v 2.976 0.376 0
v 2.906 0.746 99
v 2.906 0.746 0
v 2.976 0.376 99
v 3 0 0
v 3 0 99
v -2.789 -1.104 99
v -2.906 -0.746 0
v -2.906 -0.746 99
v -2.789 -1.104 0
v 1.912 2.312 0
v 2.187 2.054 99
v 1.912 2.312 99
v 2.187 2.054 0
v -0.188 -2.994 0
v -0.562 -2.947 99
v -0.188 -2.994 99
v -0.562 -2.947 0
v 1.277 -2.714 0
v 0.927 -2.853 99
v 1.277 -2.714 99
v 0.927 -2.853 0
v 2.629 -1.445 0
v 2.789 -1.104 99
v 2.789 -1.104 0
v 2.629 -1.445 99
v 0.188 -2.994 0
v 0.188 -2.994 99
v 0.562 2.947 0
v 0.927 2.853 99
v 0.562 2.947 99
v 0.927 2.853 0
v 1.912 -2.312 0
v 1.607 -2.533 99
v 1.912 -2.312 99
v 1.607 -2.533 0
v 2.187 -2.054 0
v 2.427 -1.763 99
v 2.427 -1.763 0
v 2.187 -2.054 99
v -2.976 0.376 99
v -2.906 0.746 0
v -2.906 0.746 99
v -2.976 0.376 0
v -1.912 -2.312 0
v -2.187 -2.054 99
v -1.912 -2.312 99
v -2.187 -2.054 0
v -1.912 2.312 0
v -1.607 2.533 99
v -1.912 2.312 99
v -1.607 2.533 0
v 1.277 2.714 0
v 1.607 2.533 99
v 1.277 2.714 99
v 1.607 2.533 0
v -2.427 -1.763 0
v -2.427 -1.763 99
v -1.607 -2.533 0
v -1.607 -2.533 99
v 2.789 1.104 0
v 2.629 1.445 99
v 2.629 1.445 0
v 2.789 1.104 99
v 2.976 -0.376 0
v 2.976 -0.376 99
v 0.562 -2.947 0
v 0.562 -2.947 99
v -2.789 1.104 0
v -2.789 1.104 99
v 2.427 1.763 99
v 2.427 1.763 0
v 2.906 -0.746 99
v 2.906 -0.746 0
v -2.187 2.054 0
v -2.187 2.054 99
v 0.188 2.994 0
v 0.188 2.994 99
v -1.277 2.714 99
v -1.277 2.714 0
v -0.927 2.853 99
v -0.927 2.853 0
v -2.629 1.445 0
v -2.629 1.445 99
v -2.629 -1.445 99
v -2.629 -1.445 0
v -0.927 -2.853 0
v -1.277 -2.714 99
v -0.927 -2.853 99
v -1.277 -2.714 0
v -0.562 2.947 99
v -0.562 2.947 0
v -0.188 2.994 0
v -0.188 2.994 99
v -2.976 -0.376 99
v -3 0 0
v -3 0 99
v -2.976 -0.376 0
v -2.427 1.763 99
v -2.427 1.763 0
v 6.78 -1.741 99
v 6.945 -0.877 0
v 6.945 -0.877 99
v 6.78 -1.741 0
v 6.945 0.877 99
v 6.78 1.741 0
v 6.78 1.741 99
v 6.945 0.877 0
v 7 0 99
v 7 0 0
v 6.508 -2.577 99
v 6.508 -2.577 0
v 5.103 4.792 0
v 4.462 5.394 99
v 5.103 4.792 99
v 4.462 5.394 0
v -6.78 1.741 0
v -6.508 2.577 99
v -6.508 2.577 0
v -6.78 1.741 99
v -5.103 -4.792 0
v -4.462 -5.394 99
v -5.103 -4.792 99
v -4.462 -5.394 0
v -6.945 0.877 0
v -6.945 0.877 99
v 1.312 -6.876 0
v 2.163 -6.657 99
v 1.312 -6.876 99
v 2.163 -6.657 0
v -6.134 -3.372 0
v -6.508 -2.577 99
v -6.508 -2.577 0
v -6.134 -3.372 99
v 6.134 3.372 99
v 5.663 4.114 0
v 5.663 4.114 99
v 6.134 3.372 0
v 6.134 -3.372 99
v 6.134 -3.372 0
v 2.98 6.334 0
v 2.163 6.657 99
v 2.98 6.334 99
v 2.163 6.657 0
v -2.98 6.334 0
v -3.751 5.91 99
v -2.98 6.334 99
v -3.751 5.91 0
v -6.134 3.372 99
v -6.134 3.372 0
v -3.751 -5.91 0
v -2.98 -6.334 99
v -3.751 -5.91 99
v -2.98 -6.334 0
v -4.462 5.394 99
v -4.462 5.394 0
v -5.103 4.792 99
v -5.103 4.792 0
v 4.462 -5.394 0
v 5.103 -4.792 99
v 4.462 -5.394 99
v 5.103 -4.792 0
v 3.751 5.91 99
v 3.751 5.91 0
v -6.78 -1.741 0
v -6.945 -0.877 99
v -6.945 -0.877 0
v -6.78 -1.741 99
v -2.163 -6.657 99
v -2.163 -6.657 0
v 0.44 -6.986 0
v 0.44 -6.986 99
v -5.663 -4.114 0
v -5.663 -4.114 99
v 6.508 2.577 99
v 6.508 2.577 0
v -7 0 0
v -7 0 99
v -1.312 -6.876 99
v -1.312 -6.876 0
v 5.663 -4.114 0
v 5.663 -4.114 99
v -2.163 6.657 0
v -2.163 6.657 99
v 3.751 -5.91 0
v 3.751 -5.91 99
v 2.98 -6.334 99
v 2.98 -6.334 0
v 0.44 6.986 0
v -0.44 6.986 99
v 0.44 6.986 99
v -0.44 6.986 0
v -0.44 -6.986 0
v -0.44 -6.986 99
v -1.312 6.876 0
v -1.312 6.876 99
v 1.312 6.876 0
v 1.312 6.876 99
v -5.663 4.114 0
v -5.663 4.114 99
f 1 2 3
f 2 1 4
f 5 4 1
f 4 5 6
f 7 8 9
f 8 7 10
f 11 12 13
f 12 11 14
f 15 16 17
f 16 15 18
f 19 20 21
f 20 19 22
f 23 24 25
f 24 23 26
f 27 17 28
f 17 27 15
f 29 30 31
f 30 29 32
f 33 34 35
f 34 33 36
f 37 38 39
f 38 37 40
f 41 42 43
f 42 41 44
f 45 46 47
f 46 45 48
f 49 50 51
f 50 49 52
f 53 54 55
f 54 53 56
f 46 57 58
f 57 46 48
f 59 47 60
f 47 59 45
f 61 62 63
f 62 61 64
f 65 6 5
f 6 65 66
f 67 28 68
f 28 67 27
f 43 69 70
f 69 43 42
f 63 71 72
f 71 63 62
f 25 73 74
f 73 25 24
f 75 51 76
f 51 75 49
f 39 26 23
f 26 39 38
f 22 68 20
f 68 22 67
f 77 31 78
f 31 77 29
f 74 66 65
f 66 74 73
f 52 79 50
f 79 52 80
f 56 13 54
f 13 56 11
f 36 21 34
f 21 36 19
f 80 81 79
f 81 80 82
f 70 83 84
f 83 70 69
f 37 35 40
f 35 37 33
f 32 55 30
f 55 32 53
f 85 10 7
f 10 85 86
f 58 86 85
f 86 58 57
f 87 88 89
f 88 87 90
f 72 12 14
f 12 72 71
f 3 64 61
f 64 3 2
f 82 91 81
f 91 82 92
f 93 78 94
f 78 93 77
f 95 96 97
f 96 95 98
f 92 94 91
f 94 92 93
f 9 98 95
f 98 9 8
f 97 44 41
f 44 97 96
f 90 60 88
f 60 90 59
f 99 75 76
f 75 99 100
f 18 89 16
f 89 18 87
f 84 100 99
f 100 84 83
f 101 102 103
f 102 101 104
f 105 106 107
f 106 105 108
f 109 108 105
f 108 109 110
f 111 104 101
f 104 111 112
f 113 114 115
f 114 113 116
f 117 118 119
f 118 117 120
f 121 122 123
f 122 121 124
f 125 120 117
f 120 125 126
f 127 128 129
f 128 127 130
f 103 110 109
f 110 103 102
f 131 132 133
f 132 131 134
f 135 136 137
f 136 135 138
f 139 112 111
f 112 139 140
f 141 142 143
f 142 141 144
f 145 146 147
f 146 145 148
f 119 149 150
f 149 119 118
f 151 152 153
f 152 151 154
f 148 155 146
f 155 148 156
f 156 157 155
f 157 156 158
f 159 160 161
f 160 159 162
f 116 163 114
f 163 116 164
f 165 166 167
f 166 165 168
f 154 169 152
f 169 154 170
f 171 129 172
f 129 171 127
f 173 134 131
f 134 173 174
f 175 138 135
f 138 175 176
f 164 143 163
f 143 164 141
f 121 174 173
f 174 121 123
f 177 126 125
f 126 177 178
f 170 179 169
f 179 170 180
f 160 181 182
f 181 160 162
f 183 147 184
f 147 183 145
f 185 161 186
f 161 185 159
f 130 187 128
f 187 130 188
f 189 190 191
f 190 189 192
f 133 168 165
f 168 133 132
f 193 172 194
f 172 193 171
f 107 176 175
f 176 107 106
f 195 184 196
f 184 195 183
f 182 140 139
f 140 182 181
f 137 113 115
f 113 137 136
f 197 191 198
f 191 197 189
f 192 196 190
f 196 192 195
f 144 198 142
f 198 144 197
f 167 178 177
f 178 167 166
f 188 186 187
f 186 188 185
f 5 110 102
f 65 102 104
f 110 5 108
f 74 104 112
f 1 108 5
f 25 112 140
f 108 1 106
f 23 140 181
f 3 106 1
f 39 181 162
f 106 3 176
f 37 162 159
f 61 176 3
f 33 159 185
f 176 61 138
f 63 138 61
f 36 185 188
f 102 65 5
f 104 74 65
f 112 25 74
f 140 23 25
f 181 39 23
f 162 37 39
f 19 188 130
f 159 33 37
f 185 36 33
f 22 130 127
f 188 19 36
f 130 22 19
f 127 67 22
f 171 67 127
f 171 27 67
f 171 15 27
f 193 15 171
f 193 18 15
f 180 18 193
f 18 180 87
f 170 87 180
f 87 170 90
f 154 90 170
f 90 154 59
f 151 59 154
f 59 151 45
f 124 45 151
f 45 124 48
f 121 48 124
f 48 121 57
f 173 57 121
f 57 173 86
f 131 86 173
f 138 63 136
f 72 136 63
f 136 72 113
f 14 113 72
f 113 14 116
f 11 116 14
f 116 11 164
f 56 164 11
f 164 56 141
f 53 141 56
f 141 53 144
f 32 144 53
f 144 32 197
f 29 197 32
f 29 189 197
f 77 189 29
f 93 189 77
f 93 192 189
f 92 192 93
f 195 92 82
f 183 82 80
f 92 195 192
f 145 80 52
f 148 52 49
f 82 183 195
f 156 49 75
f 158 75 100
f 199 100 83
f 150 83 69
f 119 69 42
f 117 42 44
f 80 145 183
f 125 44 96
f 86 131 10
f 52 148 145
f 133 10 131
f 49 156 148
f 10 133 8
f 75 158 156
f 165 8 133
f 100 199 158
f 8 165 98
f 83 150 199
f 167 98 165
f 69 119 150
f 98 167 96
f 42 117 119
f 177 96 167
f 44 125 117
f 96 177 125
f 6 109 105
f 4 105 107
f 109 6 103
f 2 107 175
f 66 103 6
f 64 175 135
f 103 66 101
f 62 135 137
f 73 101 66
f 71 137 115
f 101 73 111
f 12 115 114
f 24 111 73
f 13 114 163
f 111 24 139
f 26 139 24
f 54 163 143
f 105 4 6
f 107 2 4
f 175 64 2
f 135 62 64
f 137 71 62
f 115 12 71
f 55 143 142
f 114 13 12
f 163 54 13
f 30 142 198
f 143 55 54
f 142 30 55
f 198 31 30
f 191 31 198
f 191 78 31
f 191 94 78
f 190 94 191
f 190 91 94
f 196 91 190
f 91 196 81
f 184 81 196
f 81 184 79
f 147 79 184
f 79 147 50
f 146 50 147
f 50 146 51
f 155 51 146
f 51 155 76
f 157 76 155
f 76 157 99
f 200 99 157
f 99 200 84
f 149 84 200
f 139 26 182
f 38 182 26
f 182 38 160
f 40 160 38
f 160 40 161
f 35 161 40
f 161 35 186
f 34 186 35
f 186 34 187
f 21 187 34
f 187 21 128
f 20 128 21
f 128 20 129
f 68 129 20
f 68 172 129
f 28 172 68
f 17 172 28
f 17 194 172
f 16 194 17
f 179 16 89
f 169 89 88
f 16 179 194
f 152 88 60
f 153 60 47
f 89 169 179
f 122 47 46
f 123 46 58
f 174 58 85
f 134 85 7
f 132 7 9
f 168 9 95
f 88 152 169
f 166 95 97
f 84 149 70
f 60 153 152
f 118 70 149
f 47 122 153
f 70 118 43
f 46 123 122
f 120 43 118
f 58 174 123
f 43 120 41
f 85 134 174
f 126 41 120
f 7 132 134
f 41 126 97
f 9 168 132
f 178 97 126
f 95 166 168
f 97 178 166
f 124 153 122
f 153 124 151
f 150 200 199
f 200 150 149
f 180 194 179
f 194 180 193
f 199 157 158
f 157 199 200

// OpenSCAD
$fn = 50;


difference() {
	union() {
		cylinder(h = 99, r = 7.0000000000);
	}
	union() {
		translate(v = [0, 0, -100]) {
			cylinder(h = 200, r = 3.0000000000);
		}
		translate(v = [0, 0, -100]) {
			cylinder(h = 200, r = 1.5000000000);
		}
	}
}
